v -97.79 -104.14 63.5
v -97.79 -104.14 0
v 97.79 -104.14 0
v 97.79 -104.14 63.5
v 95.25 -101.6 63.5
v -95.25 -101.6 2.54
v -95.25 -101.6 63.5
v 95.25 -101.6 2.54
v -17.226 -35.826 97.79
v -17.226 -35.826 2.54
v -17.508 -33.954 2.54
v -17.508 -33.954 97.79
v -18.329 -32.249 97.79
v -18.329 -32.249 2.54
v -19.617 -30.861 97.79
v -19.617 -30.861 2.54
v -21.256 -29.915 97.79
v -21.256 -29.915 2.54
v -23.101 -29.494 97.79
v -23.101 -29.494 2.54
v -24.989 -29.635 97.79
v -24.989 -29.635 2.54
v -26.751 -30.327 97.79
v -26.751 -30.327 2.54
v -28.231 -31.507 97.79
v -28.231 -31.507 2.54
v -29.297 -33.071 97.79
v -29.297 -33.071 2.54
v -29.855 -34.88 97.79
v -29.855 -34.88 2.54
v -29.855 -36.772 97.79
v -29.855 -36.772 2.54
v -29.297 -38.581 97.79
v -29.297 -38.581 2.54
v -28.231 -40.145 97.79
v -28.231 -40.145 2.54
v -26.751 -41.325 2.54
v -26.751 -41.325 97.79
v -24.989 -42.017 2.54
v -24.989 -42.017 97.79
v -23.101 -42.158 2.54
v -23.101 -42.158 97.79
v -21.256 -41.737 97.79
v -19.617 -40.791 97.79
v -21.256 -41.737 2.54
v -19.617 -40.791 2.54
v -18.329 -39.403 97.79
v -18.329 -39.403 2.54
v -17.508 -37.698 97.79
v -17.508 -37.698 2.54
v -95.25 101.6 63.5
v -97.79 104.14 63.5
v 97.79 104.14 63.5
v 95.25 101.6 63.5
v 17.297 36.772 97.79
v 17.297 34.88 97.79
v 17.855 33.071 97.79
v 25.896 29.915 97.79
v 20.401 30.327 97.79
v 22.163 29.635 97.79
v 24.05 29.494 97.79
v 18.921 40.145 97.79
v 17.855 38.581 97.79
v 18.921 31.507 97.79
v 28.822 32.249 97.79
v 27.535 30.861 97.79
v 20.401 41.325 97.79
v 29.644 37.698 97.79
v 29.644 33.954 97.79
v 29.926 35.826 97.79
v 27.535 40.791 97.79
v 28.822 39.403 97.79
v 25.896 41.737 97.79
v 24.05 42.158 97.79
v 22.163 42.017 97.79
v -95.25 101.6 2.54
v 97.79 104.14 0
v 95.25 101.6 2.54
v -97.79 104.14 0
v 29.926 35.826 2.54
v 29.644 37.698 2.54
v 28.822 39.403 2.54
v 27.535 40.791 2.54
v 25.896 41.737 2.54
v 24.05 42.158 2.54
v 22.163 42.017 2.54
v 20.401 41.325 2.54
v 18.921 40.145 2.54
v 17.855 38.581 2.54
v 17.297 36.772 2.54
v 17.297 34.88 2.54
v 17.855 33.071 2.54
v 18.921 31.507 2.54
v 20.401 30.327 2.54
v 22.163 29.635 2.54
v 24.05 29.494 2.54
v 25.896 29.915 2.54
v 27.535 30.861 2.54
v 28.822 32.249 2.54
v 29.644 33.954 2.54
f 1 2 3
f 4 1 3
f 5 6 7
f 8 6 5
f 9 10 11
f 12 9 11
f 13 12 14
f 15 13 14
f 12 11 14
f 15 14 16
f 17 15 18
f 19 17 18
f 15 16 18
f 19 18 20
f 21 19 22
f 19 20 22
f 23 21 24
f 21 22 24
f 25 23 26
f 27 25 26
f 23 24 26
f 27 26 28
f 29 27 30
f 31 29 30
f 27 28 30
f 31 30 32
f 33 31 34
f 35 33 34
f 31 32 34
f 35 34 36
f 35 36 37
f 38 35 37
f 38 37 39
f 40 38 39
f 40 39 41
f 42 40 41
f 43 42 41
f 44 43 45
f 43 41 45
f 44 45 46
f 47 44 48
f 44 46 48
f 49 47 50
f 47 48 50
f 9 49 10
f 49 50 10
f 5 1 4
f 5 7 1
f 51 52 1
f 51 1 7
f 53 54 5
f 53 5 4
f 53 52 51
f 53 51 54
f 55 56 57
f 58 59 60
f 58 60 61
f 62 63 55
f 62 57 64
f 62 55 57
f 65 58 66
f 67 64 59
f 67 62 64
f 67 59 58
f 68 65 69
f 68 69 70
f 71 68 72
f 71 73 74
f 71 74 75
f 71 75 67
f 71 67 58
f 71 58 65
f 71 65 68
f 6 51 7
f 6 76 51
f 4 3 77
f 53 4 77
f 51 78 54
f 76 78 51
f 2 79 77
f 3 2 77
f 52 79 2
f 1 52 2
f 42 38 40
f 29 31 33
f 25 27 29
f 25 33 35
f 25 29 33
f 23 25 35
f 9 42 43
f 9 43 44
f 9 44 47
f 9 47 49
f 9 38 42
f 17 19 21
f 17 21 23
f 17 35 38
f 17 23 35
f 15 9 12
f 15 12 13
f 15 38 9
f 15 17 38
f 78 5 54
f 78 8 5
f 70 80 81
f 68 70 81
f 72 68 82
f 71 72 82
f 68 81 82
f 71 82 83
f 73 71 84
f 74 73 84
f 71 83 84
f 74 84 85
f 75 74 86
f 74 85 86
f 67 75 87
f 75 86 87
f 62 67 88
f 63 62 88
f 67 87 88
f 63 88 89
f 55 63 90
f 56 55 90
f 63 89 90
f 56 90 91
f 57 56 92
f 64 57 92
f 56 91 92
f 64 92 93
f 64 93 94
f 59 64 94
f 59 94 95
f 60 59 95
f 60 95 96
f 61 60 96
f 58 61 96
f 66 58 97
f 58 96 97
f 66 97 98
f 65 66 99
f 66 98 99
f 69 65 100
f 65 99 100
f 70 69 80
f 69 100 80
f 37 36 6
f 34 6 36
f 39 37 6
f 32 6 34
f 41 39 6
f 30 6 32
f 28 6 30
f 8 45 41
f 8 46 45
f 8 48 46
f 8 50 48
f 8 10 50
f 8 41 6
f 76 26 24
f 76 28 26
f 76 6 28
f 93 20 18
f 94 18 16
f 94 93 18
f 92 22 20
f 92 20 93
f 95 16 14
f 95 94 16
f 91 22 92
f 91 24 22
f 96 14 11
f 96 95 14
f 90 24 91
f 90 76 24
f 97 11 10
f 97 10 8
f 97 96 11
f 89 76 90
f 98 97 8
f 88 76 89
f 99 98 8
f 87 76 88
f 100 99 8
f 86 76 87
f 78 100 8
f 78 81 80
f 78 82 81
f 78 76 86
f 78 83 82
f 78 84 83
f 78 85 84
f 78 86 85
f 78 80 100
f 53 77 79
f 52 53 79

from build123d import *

# Parameters (mm, degrees)
F1_DEPTH = 63.5
F2_T     = -2.54
F3_R     = 6.35
F4_DEPTH = 95.25


with BuildPart() as f1:
    # F0 (on Top) → F1 (new body)
    with BuildSketch(Plane.XY):
        Polygon((97.79, 104.14), (0, 104.14), (-97.79, 104.14), (-97.79, -104.14), (97.79, -104.14), (97.79, 0), align=None)
    extrude(amount=F1_DEPTH)

    # F2
    f2_openings = [f1.faces().sort_by_distance(p)[0] for p in [
        (0, 0, 63.5),
    ]]
    offset(amount=F2_T, openings=f2_openings)

    # F3 (on face) → F4 (join)
    with BuildSketch(Plane.XY.offset(2.54)):
        with Locations((23.5758665949, 35.8260651119)):
            Circle(F3_R)
        with Locations((-23.5758665949, -35.8260651119)):
            Circle(F3_R)
    extrude(amount=F4_DEPTH)


solid = f1.part
